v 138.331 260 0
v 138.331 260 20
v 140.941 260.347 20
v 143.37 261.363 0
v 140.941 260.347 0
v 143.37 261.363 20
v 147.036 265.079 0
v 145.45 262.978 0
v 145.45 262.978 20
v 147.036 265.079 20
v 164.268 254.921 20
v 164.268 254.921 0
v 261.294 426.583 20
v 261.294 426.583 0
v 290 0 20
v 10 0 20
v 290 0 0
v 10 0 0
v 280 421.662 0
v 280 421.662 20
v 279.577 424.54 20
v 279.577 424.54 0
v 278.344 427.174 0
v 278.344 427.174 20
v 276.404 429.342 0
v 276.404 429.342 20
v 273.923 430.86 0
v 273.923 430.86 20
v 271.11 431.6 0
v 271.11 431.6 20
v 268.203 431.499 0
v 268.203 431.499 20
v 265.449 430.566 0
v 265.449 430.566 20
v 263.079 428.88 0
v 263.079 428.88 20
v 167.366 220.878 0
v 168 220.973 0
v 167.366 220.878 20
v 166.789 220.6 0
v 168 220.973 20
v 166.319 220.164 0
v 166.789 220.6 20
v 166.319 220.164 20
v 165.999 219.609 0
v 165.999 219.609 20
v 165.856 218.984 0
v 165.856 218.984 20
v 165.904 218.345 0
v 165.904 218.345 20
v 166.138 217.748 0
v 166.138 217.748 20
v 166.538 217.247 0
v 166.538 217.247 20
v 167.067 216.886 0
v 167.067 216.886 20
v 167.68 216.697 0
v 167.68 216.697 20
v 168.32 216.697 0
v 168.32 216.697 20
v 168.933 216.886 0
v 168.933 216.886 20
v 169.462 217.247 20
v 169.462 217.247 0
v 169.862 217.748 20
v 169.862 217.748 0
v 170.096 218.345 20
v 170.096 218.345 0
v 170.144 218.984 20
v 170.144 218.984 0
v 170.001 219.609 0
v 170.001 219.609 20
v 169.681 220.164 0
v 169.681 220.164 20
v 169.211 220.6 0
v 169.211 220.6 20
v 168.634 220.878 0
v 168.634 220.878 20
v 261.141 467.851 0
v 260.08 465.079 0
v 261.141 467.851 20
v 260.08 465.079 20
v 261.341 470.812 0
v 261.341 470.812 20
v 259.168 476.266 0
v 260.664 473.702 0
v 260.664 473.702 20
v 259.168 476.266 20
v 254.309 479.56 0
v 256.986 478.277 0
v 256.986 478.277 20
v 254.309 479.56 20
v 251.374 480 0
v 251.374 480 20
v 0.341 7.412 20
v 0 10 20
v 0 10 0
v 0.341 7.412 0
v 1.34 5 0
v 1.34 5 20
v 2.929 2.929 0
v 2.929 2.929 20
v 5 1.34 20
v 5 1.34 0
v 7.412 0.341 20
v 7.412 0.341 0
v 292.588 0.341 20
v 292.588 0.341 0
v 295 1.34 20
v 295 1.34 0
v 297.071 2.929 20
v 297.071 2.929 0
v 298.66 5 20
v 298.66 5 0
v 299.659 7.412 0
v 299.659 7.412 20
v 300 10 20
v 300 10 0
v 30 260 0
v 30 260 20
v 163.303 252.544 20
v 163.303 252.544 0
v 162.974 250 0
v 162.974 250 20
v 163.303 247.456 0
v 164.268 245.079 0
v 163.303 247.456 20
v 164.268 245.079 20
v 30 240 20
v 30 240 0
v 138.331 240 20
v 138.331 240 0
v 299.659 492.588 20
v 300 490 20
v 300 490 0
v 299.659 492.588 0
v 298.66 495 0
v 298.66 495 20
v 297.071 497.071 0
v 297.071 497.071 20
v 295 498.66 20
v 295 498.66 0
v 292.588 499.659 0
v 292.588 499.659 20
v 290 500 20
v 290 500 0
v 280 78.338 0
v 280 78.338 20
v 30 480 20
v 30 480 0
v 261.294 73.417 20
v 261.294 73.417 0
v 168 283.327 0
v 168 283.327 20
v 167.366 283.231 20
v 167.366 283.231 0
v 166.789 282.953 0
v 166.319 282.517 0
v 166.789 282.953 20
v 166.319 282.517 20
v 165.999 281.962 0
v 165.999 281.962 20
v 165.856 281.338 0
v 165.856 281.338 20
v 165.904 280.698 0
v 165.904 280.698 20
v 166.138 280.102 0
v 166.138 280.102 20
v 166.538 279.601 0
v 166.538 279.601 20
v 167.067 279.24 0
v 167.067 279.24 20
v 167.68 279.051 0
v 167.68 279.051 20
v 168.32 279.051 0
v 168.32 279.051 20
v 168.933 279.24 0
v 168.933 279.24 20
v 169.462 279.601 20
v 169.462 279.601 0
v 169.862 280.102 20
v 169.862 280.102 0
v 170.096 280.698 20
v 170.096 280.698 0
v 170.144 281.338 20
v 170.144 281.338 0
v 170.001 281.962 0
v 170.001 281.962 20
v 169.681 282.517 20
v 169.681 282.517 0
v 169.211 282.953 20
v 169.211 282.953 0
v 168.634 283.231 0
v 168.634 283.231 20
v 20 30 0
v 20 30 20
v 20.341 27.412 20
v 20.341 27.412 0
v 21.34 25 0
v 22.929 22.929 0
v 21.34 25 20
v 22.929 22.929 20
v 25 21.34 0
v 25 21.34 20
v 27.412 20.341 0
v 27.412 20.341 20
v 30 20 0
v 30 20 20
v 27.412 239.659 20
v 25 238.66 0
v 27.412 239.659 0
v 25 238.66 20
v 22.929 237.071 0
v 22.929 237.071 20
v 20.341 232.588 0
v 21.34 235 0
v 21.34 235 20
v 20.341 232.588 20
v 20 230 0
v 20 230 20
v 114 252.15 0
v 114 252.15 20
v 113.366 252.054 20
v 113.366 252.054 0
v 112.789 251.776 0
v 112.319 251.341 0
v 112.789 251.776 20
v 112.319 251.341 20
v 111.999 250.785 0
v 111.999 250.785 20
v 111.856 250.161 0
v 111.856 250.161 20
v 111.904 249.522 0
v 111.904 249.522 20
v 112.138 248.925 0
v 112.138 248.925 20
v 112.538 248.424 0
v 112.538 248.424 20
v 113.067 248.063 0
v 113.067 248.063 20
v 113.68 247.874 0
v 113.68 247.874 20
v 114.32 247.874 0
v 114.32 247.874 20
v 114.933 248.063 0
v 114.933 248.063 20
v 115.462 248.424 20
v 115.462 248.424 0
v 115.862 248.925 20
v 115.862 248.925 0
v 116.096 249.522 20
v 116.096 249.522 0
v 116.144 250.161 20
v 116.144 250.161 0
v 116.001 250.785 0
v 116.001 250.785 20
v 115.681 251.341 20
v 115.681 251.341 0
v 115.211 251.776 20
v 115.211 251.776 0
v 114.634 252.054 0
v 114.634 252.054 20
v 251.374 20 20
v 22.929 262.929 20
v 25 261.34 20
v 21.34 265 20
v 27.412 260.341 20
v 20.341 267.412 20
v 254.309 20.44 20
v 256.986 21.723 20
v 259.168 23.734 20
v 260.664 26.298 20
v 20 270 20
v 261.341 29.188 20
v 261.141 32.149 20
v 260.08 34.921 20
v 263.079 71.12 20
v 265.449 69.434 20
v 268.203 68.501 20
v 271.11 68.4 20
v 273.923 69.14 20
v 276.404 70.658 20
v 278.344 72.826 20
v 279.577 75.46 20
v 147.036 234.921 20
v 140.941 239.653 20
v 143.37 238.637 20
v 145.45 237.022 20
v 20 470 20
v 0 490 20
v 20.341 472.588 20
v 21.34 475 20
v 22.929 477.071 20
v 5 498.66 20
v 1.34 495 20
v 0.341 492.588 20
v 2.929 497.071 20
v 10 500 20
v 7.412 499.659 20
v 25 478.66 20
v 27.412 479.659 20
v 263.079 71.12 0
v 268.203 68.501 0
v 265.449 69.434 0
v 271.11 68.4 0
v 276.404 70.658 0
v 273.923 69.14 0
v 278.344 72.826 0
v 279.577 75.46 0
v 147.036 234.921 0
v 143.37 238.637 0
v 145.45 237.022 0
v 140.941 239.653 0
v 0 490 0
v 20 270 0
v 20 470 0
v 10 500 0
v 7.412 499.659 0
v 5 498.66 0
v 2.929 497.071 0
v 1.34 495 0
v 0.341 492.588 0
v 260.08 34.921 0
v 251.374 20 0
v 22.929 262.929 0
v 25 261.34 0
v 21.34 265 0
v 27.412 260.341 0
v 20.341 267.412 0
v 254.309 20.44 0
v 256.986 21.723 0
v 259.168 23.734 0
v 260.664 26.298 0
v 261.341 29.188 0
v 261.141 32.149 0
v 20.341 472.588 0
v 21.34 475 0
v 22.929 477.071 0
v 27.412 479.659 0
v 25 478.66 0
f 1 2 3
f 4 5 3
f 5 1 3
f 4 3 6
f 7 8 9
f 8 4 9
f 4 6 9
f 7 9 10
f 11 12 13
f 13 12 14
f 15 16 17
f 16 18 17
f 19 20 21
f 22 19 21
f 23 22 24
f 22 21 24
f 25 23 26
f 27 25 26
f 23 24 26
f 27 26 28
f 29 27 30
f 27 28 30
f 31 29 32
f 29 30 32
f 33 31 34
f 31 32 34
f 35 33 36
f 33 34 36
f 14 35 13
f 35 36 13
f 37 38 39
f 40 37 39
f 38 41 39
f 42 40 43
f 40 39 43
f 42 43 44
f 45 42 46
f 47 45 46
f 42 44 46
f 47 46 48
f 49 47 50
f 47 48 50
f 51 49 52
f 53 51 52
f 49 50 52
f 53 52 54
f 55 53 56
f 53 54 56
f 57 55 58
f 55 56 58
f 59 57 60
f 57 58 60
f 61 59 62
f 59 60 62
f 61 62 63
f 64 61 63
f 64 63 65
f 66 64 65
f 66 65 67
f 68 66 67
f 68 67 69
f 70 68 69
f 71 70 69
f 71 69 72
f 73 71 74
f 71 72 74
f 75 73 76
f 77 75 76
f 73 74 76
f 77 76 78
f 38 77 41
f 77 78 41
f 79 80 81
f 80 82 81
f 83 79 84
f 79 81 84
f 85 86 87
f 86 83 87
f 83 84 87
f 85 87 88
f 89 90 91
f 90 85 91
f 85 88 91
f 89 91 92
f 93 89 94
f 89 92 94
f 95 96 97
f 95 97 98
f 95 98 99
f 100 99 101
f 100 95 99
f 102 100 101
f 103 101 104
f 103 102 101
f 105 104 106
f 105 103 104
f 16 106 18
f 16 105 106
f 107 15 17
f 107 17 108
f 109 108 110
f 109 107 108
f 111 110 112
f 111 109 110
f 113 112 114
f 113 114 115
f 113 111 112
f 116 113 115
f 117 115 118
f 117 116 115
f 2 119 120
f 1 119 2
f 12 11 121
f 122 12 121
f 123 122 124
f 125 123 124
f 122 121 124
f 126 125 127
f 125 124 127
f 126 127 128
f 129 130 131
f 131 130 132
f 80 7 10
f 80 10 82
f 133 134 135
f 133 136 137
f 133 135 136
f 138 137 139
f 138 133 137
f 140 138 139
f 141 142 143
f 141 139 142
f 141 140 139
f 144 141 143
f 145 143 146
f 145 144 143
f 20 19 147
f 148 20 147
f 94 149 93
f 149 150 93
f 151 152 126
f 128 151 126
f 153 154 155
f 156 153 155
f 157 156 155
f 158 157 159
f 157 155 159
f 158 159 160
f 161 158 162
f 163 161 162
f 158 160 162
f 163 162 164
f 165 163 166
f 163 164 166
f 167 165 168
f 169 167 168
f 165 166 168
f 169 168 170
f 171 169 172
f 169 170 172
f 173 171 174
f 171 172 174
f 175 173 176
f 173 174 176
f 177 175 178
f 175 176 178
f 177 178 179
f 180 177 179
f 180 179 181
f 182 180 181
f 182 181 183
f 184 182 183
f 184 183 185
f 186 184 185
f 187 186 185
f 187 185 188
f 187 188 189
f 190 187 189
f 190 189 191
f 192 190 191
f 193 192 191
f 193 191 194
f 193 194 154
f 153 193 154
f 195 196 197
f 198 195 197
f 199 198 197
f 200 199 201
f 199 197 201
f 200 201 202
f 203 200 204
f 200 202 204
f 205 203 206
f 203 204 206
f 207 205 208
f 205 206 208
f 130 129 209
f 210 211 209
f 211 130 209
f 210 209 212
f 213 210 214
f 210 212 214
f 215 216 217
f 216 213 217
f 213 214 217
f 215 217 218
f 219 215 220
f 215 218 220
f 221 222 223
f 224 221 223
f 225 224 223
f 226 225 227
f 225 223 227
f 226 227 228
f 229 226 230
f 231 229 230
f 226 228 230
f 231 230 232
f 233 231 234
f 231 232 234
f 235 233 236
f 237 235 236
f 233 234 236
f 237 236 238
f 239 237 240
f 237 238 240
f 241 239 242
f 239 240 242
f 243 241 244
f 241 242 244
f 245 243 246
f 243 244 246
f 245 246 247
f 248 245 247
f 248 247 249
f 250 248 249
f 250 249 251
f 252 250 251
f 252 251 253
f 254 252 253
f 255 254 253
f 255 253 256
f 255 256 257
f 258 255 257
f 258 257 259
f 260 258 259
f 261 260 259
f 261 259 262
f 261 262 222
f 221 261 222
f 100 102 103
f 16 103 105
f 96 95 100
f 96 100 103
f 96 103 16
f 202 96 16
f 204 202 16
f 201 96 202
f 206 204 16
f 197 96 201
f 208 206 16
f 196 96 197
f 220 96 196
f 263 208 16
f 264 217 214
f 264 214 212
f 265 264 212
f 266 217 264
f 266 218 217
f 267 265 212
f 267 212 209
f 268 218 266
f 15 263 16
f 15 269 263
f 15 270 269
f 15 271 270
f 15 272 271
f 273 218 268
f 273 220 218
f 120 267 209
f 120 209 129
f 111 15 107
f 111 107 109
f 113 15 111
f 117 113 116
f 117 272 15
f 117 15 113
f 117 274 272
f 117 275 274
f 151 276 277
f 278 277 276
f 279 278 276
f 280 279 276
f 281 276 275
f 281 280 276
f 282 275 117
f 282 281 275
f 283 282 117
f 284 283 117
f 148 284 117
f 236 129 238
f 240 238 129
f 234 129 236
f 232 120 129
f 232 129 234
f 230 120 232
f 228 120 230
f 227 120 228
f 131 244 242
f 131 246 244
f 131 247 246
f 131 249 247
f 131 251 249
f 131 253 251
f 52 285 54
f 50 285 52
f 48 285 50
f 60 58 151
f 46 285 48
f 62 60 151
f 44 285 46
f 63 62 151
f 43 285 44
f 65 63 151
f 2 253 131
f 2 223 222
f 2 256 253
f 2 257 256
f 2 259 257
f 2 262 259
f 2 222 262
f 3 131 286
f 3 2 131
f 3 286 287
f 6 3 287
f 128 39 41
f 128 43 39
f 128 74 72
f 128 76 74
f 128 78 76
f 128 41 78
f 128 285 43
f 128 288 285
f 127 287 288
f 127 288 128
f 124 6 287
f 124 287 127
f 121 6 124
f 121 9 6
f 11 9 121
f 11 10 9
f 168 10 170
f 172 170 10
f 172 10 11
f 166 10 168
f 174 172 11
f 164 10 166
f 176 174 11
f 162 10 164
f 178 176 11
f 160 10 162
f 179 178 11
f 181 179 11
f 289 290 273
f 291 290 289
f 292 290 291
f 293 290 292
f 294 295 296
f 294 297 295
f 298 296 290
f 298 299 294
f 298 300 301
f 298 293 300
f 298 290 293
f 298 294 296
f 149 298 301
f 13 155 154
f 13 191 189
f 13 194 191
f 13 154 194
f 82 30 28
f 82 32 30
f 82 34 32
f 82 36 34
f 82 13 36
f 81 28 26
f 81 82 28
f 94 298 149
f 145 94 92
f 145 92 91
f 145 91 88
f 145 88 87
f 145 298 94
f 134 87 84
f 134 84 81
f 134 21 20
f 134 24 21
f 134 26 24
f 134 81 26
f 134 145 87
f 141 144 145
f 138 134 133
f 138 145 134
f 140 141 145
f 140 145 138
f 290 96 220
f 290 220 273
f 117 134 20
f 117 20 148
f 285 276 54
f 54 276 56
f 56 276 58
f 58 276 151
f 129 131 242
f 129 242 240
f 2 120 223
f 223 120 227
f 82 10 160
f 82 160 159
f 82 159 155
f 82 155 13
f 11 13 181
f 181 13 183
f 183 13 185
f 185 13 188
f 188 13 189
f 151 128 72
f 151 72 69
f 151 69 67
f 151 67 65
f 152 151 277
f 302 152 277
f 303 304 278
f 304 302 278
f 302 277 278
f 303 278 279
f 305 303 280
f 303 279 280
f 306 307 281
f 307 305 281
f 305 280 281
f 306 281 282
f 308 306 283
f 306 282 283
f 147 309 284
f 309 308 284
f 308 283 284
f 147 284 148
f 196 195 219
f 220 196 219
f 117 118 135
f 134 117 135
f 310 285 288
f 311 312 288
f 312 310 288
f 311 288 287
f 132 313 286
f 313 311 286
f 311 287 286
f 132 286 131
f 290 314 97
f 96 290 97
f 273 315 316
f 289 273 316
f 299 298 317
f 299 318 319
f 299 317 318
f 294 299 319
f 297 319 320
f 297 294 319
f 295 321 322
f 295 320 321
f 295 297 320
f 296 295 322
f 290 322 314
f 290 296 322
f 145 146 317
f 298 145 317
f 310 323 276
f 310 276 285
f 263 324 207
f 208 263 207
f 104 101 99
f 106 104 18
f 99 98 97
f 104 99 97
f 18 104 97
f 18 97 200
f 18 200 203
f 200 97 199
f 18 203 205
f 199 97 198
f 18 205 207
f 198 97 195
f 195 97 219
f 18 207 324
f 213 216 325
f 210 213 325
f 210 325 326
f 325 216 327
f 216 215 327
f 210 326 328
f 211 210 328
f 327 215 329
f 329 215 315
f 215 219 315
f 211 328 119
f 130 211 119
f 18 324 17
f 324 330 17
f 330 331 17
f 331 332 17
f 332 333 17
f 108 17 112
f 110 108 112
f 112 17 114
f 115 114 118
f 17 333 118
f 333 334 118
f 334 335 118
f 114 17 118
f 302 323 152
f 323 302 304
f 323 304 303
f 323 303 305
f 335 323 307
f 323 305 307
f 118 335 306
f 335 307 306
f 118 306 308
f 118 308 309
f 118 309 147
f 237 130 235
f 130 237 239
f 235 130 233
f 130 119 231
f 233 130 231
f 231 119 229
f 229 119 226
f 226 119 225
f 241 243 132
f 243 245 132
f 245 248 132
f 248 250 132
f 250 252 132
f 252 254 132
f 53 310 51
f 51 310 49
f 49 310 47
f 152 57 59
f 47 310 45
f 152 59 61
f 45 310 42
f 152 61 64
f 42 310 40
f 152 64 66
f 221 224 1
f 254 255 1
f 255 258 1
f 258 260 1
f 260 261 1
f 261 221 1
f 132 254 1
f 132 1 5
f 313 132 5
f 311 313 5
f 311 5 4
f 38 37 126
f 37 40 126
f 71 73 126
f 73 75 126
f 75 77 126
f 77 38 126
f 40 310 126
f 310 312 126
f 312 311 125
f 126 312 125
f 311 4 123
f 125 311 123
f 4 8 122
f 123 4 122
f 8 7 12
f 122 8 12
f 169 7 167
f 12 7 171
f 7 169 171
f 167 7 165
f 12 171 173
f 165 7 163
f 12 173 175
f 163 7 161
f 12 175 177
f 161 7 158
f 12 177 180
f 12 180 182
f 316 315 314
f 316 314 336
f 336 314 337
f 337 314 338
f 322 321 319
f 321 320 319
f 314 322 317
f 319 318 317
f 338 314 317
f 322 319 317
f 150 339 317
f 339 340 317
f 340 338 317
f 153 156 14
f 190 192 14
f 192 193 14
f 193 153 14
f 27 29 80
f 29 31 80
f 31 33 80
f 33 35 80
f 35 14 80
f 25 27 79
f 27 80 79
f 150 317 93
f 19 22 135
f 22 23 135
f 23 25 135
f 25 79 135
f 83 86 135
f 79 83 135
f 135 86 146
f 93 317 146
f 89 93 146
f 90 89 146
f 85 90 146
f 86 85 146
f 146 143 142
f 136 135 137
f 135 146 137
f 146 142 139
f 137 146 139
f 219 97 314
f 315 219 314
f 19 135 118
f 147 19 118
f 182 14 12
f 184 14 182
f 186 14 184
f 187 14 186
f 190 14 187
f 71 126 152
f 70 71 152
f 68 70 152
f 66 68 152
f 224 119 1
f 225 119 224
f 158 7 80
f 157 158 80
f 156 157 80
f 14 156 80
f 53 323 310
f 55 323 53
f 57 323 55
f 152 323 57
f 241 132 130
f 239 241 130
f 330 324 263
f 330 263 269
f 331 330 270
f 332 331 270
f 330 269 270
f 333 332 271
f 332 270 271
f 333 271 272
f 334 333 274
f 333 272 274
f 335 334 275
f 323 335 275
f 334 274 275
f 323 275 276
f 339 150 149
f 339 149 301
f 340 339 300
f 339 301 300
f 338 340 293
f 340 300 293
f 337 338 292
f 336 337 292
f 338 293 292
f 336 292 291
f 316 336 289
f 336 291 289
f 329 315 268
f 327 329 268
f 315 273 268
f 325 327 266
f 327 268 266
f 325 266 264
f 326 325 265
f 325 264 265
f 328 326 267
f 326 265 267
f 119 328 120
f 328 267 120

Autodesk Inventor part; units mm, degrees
ref_plane "YZ Plane" through (0, 0, 0) normal (1, 0, 0) x (0, 1, 0)
ref_plane "XZ Plane" through (0, 0, 0) normal (0, 1, 0) x (-1, 0, 0)
ref_plane "XY Plane" through (0, 0, 0) normal (0, 0, 1) x (1, 0, 0)
sketch "Sketch5" plane through (0, 0, 0) normal (0, 0, 1) x (1, 0, 0)
  line L0 (0, 0) -> (300, 0)
  line L1 (300, 0) -> (300, 500)
  line L2 (300, 500) -> (0, 500)
  line L3 (0, 500) -> (0, 0)
  line L4 (20, 480) -> (280, 480)
  line L5 (280, 480) -> (280, 20)
  line L6 (280, 20) -> (20, 20)
  line L7 (20, 20) -> (20, 480)
  line L8 (150, 0) -> (150, 500)
  circle A0 centre (150, 250) radius 36
  circle A1 centre (114, 250) radius 2
  circle A2 centre (168, 218.8231) radius 2
  circle A3 centre (168, 281.1769) radius 2
  line L9 (20, 250) -> (150, 250)
  line L10 (20, 240) -> (150, 240)
  line L11 (20, 260) -> (150, 260)
  line L12 (280, 20) -> (150, 250)
  line L13 (150, 250) -> (280, 480)
  line L14 (271.2944, 15.0794) -> (141.2944, 245.0794)
  line L15 (288.7056, 24.9206) -> (158.7056, 254.9206)
  line L16 (158.7056, 245.0794) -> (288.7056, 475.0794)
  line L17 (141.2944, 254.9206) -> (271.2944, 484.9206)
  point P0 (161.4868, 250)
  point P1 (280, 459.6772)
  point P2 (280, 40.3228)
  point P3 (144.1654, 240)
  point P4 (268.5132, 20)
  point P5 (268.5132, 480)
  point P6 (144.1654, 260)
  dimension "d31" = 72
  dimension "d28" = 300
  dimension "d29" = 500
  dimension "d30" = 20
  dimension "d32" = 4
  dimension "d35" = 360
  dimension "d37" = 10
  dimension "d38" = 10
  dimension "d39" = 10
  dimension "d40" = 10
  dimension "d41" = 10
  dimension "d42" = 10
extrude "Extrusion5" add sketch "Sketch5" along normal blind 20 contours L3 L2 L8 L4 L7 L6 L0 | L8 L6 L5 L4 L2 L1 L0 | L14 A0 A2 L12 L6 | L12 A2 A0 L15 L5 | L14 L8 L12 A2 A0 | L7 L9 A1 A0 L10 | L14 L10 L8 | A0 A1 L9 L8 L10 | L4 L13 A3 A0 L17 | L12 A0 A2 | A2 A0 L12 | A2 L12 A0 | L7 L11 A0 A1 L9 | A1 L9 A0 | A0 L9 A1 | L5 L16 A0 A3 L13 | A0 A3 L13 L8 L17 | L8 L11 L17 | L11 L8 L9 A1 A0 | A0 A2 L12 L13 A3 L16 L15 | L12 A2 A0 | A1 A0 L9 | A0 A1 L9 | L13 A0 A3 | A3 A0 L13 | A0 L13 A3 | L13 A0 A3
hole "Hole1" at (168, 218.8231, 0) at (168, 281.1769, 0) at (114, 250, 0) direction (0, 0, 1) diameter 4.3 depth 20 clearance for "Socket Head Cap Screw ISO 4762" size "M4" standard "ISO"
fillet "Fillet1" radius 10 15 edges at (0, 0, 10) (20, 20, 10) (300, 0, 10) (268.5132, 20, 10) (280, 40.3228, 10) (144.1654, 240, 10) (144.1654, 260, 10) (161.4868, 250, 10) (20, 240, 10) (20, 260, 10) (0, 500, 10) (20, 480, 10) (300, 500, 10) (268.5132, 480, 10) (280, 459.6772, 10)
properties part number "Aufhängung"
